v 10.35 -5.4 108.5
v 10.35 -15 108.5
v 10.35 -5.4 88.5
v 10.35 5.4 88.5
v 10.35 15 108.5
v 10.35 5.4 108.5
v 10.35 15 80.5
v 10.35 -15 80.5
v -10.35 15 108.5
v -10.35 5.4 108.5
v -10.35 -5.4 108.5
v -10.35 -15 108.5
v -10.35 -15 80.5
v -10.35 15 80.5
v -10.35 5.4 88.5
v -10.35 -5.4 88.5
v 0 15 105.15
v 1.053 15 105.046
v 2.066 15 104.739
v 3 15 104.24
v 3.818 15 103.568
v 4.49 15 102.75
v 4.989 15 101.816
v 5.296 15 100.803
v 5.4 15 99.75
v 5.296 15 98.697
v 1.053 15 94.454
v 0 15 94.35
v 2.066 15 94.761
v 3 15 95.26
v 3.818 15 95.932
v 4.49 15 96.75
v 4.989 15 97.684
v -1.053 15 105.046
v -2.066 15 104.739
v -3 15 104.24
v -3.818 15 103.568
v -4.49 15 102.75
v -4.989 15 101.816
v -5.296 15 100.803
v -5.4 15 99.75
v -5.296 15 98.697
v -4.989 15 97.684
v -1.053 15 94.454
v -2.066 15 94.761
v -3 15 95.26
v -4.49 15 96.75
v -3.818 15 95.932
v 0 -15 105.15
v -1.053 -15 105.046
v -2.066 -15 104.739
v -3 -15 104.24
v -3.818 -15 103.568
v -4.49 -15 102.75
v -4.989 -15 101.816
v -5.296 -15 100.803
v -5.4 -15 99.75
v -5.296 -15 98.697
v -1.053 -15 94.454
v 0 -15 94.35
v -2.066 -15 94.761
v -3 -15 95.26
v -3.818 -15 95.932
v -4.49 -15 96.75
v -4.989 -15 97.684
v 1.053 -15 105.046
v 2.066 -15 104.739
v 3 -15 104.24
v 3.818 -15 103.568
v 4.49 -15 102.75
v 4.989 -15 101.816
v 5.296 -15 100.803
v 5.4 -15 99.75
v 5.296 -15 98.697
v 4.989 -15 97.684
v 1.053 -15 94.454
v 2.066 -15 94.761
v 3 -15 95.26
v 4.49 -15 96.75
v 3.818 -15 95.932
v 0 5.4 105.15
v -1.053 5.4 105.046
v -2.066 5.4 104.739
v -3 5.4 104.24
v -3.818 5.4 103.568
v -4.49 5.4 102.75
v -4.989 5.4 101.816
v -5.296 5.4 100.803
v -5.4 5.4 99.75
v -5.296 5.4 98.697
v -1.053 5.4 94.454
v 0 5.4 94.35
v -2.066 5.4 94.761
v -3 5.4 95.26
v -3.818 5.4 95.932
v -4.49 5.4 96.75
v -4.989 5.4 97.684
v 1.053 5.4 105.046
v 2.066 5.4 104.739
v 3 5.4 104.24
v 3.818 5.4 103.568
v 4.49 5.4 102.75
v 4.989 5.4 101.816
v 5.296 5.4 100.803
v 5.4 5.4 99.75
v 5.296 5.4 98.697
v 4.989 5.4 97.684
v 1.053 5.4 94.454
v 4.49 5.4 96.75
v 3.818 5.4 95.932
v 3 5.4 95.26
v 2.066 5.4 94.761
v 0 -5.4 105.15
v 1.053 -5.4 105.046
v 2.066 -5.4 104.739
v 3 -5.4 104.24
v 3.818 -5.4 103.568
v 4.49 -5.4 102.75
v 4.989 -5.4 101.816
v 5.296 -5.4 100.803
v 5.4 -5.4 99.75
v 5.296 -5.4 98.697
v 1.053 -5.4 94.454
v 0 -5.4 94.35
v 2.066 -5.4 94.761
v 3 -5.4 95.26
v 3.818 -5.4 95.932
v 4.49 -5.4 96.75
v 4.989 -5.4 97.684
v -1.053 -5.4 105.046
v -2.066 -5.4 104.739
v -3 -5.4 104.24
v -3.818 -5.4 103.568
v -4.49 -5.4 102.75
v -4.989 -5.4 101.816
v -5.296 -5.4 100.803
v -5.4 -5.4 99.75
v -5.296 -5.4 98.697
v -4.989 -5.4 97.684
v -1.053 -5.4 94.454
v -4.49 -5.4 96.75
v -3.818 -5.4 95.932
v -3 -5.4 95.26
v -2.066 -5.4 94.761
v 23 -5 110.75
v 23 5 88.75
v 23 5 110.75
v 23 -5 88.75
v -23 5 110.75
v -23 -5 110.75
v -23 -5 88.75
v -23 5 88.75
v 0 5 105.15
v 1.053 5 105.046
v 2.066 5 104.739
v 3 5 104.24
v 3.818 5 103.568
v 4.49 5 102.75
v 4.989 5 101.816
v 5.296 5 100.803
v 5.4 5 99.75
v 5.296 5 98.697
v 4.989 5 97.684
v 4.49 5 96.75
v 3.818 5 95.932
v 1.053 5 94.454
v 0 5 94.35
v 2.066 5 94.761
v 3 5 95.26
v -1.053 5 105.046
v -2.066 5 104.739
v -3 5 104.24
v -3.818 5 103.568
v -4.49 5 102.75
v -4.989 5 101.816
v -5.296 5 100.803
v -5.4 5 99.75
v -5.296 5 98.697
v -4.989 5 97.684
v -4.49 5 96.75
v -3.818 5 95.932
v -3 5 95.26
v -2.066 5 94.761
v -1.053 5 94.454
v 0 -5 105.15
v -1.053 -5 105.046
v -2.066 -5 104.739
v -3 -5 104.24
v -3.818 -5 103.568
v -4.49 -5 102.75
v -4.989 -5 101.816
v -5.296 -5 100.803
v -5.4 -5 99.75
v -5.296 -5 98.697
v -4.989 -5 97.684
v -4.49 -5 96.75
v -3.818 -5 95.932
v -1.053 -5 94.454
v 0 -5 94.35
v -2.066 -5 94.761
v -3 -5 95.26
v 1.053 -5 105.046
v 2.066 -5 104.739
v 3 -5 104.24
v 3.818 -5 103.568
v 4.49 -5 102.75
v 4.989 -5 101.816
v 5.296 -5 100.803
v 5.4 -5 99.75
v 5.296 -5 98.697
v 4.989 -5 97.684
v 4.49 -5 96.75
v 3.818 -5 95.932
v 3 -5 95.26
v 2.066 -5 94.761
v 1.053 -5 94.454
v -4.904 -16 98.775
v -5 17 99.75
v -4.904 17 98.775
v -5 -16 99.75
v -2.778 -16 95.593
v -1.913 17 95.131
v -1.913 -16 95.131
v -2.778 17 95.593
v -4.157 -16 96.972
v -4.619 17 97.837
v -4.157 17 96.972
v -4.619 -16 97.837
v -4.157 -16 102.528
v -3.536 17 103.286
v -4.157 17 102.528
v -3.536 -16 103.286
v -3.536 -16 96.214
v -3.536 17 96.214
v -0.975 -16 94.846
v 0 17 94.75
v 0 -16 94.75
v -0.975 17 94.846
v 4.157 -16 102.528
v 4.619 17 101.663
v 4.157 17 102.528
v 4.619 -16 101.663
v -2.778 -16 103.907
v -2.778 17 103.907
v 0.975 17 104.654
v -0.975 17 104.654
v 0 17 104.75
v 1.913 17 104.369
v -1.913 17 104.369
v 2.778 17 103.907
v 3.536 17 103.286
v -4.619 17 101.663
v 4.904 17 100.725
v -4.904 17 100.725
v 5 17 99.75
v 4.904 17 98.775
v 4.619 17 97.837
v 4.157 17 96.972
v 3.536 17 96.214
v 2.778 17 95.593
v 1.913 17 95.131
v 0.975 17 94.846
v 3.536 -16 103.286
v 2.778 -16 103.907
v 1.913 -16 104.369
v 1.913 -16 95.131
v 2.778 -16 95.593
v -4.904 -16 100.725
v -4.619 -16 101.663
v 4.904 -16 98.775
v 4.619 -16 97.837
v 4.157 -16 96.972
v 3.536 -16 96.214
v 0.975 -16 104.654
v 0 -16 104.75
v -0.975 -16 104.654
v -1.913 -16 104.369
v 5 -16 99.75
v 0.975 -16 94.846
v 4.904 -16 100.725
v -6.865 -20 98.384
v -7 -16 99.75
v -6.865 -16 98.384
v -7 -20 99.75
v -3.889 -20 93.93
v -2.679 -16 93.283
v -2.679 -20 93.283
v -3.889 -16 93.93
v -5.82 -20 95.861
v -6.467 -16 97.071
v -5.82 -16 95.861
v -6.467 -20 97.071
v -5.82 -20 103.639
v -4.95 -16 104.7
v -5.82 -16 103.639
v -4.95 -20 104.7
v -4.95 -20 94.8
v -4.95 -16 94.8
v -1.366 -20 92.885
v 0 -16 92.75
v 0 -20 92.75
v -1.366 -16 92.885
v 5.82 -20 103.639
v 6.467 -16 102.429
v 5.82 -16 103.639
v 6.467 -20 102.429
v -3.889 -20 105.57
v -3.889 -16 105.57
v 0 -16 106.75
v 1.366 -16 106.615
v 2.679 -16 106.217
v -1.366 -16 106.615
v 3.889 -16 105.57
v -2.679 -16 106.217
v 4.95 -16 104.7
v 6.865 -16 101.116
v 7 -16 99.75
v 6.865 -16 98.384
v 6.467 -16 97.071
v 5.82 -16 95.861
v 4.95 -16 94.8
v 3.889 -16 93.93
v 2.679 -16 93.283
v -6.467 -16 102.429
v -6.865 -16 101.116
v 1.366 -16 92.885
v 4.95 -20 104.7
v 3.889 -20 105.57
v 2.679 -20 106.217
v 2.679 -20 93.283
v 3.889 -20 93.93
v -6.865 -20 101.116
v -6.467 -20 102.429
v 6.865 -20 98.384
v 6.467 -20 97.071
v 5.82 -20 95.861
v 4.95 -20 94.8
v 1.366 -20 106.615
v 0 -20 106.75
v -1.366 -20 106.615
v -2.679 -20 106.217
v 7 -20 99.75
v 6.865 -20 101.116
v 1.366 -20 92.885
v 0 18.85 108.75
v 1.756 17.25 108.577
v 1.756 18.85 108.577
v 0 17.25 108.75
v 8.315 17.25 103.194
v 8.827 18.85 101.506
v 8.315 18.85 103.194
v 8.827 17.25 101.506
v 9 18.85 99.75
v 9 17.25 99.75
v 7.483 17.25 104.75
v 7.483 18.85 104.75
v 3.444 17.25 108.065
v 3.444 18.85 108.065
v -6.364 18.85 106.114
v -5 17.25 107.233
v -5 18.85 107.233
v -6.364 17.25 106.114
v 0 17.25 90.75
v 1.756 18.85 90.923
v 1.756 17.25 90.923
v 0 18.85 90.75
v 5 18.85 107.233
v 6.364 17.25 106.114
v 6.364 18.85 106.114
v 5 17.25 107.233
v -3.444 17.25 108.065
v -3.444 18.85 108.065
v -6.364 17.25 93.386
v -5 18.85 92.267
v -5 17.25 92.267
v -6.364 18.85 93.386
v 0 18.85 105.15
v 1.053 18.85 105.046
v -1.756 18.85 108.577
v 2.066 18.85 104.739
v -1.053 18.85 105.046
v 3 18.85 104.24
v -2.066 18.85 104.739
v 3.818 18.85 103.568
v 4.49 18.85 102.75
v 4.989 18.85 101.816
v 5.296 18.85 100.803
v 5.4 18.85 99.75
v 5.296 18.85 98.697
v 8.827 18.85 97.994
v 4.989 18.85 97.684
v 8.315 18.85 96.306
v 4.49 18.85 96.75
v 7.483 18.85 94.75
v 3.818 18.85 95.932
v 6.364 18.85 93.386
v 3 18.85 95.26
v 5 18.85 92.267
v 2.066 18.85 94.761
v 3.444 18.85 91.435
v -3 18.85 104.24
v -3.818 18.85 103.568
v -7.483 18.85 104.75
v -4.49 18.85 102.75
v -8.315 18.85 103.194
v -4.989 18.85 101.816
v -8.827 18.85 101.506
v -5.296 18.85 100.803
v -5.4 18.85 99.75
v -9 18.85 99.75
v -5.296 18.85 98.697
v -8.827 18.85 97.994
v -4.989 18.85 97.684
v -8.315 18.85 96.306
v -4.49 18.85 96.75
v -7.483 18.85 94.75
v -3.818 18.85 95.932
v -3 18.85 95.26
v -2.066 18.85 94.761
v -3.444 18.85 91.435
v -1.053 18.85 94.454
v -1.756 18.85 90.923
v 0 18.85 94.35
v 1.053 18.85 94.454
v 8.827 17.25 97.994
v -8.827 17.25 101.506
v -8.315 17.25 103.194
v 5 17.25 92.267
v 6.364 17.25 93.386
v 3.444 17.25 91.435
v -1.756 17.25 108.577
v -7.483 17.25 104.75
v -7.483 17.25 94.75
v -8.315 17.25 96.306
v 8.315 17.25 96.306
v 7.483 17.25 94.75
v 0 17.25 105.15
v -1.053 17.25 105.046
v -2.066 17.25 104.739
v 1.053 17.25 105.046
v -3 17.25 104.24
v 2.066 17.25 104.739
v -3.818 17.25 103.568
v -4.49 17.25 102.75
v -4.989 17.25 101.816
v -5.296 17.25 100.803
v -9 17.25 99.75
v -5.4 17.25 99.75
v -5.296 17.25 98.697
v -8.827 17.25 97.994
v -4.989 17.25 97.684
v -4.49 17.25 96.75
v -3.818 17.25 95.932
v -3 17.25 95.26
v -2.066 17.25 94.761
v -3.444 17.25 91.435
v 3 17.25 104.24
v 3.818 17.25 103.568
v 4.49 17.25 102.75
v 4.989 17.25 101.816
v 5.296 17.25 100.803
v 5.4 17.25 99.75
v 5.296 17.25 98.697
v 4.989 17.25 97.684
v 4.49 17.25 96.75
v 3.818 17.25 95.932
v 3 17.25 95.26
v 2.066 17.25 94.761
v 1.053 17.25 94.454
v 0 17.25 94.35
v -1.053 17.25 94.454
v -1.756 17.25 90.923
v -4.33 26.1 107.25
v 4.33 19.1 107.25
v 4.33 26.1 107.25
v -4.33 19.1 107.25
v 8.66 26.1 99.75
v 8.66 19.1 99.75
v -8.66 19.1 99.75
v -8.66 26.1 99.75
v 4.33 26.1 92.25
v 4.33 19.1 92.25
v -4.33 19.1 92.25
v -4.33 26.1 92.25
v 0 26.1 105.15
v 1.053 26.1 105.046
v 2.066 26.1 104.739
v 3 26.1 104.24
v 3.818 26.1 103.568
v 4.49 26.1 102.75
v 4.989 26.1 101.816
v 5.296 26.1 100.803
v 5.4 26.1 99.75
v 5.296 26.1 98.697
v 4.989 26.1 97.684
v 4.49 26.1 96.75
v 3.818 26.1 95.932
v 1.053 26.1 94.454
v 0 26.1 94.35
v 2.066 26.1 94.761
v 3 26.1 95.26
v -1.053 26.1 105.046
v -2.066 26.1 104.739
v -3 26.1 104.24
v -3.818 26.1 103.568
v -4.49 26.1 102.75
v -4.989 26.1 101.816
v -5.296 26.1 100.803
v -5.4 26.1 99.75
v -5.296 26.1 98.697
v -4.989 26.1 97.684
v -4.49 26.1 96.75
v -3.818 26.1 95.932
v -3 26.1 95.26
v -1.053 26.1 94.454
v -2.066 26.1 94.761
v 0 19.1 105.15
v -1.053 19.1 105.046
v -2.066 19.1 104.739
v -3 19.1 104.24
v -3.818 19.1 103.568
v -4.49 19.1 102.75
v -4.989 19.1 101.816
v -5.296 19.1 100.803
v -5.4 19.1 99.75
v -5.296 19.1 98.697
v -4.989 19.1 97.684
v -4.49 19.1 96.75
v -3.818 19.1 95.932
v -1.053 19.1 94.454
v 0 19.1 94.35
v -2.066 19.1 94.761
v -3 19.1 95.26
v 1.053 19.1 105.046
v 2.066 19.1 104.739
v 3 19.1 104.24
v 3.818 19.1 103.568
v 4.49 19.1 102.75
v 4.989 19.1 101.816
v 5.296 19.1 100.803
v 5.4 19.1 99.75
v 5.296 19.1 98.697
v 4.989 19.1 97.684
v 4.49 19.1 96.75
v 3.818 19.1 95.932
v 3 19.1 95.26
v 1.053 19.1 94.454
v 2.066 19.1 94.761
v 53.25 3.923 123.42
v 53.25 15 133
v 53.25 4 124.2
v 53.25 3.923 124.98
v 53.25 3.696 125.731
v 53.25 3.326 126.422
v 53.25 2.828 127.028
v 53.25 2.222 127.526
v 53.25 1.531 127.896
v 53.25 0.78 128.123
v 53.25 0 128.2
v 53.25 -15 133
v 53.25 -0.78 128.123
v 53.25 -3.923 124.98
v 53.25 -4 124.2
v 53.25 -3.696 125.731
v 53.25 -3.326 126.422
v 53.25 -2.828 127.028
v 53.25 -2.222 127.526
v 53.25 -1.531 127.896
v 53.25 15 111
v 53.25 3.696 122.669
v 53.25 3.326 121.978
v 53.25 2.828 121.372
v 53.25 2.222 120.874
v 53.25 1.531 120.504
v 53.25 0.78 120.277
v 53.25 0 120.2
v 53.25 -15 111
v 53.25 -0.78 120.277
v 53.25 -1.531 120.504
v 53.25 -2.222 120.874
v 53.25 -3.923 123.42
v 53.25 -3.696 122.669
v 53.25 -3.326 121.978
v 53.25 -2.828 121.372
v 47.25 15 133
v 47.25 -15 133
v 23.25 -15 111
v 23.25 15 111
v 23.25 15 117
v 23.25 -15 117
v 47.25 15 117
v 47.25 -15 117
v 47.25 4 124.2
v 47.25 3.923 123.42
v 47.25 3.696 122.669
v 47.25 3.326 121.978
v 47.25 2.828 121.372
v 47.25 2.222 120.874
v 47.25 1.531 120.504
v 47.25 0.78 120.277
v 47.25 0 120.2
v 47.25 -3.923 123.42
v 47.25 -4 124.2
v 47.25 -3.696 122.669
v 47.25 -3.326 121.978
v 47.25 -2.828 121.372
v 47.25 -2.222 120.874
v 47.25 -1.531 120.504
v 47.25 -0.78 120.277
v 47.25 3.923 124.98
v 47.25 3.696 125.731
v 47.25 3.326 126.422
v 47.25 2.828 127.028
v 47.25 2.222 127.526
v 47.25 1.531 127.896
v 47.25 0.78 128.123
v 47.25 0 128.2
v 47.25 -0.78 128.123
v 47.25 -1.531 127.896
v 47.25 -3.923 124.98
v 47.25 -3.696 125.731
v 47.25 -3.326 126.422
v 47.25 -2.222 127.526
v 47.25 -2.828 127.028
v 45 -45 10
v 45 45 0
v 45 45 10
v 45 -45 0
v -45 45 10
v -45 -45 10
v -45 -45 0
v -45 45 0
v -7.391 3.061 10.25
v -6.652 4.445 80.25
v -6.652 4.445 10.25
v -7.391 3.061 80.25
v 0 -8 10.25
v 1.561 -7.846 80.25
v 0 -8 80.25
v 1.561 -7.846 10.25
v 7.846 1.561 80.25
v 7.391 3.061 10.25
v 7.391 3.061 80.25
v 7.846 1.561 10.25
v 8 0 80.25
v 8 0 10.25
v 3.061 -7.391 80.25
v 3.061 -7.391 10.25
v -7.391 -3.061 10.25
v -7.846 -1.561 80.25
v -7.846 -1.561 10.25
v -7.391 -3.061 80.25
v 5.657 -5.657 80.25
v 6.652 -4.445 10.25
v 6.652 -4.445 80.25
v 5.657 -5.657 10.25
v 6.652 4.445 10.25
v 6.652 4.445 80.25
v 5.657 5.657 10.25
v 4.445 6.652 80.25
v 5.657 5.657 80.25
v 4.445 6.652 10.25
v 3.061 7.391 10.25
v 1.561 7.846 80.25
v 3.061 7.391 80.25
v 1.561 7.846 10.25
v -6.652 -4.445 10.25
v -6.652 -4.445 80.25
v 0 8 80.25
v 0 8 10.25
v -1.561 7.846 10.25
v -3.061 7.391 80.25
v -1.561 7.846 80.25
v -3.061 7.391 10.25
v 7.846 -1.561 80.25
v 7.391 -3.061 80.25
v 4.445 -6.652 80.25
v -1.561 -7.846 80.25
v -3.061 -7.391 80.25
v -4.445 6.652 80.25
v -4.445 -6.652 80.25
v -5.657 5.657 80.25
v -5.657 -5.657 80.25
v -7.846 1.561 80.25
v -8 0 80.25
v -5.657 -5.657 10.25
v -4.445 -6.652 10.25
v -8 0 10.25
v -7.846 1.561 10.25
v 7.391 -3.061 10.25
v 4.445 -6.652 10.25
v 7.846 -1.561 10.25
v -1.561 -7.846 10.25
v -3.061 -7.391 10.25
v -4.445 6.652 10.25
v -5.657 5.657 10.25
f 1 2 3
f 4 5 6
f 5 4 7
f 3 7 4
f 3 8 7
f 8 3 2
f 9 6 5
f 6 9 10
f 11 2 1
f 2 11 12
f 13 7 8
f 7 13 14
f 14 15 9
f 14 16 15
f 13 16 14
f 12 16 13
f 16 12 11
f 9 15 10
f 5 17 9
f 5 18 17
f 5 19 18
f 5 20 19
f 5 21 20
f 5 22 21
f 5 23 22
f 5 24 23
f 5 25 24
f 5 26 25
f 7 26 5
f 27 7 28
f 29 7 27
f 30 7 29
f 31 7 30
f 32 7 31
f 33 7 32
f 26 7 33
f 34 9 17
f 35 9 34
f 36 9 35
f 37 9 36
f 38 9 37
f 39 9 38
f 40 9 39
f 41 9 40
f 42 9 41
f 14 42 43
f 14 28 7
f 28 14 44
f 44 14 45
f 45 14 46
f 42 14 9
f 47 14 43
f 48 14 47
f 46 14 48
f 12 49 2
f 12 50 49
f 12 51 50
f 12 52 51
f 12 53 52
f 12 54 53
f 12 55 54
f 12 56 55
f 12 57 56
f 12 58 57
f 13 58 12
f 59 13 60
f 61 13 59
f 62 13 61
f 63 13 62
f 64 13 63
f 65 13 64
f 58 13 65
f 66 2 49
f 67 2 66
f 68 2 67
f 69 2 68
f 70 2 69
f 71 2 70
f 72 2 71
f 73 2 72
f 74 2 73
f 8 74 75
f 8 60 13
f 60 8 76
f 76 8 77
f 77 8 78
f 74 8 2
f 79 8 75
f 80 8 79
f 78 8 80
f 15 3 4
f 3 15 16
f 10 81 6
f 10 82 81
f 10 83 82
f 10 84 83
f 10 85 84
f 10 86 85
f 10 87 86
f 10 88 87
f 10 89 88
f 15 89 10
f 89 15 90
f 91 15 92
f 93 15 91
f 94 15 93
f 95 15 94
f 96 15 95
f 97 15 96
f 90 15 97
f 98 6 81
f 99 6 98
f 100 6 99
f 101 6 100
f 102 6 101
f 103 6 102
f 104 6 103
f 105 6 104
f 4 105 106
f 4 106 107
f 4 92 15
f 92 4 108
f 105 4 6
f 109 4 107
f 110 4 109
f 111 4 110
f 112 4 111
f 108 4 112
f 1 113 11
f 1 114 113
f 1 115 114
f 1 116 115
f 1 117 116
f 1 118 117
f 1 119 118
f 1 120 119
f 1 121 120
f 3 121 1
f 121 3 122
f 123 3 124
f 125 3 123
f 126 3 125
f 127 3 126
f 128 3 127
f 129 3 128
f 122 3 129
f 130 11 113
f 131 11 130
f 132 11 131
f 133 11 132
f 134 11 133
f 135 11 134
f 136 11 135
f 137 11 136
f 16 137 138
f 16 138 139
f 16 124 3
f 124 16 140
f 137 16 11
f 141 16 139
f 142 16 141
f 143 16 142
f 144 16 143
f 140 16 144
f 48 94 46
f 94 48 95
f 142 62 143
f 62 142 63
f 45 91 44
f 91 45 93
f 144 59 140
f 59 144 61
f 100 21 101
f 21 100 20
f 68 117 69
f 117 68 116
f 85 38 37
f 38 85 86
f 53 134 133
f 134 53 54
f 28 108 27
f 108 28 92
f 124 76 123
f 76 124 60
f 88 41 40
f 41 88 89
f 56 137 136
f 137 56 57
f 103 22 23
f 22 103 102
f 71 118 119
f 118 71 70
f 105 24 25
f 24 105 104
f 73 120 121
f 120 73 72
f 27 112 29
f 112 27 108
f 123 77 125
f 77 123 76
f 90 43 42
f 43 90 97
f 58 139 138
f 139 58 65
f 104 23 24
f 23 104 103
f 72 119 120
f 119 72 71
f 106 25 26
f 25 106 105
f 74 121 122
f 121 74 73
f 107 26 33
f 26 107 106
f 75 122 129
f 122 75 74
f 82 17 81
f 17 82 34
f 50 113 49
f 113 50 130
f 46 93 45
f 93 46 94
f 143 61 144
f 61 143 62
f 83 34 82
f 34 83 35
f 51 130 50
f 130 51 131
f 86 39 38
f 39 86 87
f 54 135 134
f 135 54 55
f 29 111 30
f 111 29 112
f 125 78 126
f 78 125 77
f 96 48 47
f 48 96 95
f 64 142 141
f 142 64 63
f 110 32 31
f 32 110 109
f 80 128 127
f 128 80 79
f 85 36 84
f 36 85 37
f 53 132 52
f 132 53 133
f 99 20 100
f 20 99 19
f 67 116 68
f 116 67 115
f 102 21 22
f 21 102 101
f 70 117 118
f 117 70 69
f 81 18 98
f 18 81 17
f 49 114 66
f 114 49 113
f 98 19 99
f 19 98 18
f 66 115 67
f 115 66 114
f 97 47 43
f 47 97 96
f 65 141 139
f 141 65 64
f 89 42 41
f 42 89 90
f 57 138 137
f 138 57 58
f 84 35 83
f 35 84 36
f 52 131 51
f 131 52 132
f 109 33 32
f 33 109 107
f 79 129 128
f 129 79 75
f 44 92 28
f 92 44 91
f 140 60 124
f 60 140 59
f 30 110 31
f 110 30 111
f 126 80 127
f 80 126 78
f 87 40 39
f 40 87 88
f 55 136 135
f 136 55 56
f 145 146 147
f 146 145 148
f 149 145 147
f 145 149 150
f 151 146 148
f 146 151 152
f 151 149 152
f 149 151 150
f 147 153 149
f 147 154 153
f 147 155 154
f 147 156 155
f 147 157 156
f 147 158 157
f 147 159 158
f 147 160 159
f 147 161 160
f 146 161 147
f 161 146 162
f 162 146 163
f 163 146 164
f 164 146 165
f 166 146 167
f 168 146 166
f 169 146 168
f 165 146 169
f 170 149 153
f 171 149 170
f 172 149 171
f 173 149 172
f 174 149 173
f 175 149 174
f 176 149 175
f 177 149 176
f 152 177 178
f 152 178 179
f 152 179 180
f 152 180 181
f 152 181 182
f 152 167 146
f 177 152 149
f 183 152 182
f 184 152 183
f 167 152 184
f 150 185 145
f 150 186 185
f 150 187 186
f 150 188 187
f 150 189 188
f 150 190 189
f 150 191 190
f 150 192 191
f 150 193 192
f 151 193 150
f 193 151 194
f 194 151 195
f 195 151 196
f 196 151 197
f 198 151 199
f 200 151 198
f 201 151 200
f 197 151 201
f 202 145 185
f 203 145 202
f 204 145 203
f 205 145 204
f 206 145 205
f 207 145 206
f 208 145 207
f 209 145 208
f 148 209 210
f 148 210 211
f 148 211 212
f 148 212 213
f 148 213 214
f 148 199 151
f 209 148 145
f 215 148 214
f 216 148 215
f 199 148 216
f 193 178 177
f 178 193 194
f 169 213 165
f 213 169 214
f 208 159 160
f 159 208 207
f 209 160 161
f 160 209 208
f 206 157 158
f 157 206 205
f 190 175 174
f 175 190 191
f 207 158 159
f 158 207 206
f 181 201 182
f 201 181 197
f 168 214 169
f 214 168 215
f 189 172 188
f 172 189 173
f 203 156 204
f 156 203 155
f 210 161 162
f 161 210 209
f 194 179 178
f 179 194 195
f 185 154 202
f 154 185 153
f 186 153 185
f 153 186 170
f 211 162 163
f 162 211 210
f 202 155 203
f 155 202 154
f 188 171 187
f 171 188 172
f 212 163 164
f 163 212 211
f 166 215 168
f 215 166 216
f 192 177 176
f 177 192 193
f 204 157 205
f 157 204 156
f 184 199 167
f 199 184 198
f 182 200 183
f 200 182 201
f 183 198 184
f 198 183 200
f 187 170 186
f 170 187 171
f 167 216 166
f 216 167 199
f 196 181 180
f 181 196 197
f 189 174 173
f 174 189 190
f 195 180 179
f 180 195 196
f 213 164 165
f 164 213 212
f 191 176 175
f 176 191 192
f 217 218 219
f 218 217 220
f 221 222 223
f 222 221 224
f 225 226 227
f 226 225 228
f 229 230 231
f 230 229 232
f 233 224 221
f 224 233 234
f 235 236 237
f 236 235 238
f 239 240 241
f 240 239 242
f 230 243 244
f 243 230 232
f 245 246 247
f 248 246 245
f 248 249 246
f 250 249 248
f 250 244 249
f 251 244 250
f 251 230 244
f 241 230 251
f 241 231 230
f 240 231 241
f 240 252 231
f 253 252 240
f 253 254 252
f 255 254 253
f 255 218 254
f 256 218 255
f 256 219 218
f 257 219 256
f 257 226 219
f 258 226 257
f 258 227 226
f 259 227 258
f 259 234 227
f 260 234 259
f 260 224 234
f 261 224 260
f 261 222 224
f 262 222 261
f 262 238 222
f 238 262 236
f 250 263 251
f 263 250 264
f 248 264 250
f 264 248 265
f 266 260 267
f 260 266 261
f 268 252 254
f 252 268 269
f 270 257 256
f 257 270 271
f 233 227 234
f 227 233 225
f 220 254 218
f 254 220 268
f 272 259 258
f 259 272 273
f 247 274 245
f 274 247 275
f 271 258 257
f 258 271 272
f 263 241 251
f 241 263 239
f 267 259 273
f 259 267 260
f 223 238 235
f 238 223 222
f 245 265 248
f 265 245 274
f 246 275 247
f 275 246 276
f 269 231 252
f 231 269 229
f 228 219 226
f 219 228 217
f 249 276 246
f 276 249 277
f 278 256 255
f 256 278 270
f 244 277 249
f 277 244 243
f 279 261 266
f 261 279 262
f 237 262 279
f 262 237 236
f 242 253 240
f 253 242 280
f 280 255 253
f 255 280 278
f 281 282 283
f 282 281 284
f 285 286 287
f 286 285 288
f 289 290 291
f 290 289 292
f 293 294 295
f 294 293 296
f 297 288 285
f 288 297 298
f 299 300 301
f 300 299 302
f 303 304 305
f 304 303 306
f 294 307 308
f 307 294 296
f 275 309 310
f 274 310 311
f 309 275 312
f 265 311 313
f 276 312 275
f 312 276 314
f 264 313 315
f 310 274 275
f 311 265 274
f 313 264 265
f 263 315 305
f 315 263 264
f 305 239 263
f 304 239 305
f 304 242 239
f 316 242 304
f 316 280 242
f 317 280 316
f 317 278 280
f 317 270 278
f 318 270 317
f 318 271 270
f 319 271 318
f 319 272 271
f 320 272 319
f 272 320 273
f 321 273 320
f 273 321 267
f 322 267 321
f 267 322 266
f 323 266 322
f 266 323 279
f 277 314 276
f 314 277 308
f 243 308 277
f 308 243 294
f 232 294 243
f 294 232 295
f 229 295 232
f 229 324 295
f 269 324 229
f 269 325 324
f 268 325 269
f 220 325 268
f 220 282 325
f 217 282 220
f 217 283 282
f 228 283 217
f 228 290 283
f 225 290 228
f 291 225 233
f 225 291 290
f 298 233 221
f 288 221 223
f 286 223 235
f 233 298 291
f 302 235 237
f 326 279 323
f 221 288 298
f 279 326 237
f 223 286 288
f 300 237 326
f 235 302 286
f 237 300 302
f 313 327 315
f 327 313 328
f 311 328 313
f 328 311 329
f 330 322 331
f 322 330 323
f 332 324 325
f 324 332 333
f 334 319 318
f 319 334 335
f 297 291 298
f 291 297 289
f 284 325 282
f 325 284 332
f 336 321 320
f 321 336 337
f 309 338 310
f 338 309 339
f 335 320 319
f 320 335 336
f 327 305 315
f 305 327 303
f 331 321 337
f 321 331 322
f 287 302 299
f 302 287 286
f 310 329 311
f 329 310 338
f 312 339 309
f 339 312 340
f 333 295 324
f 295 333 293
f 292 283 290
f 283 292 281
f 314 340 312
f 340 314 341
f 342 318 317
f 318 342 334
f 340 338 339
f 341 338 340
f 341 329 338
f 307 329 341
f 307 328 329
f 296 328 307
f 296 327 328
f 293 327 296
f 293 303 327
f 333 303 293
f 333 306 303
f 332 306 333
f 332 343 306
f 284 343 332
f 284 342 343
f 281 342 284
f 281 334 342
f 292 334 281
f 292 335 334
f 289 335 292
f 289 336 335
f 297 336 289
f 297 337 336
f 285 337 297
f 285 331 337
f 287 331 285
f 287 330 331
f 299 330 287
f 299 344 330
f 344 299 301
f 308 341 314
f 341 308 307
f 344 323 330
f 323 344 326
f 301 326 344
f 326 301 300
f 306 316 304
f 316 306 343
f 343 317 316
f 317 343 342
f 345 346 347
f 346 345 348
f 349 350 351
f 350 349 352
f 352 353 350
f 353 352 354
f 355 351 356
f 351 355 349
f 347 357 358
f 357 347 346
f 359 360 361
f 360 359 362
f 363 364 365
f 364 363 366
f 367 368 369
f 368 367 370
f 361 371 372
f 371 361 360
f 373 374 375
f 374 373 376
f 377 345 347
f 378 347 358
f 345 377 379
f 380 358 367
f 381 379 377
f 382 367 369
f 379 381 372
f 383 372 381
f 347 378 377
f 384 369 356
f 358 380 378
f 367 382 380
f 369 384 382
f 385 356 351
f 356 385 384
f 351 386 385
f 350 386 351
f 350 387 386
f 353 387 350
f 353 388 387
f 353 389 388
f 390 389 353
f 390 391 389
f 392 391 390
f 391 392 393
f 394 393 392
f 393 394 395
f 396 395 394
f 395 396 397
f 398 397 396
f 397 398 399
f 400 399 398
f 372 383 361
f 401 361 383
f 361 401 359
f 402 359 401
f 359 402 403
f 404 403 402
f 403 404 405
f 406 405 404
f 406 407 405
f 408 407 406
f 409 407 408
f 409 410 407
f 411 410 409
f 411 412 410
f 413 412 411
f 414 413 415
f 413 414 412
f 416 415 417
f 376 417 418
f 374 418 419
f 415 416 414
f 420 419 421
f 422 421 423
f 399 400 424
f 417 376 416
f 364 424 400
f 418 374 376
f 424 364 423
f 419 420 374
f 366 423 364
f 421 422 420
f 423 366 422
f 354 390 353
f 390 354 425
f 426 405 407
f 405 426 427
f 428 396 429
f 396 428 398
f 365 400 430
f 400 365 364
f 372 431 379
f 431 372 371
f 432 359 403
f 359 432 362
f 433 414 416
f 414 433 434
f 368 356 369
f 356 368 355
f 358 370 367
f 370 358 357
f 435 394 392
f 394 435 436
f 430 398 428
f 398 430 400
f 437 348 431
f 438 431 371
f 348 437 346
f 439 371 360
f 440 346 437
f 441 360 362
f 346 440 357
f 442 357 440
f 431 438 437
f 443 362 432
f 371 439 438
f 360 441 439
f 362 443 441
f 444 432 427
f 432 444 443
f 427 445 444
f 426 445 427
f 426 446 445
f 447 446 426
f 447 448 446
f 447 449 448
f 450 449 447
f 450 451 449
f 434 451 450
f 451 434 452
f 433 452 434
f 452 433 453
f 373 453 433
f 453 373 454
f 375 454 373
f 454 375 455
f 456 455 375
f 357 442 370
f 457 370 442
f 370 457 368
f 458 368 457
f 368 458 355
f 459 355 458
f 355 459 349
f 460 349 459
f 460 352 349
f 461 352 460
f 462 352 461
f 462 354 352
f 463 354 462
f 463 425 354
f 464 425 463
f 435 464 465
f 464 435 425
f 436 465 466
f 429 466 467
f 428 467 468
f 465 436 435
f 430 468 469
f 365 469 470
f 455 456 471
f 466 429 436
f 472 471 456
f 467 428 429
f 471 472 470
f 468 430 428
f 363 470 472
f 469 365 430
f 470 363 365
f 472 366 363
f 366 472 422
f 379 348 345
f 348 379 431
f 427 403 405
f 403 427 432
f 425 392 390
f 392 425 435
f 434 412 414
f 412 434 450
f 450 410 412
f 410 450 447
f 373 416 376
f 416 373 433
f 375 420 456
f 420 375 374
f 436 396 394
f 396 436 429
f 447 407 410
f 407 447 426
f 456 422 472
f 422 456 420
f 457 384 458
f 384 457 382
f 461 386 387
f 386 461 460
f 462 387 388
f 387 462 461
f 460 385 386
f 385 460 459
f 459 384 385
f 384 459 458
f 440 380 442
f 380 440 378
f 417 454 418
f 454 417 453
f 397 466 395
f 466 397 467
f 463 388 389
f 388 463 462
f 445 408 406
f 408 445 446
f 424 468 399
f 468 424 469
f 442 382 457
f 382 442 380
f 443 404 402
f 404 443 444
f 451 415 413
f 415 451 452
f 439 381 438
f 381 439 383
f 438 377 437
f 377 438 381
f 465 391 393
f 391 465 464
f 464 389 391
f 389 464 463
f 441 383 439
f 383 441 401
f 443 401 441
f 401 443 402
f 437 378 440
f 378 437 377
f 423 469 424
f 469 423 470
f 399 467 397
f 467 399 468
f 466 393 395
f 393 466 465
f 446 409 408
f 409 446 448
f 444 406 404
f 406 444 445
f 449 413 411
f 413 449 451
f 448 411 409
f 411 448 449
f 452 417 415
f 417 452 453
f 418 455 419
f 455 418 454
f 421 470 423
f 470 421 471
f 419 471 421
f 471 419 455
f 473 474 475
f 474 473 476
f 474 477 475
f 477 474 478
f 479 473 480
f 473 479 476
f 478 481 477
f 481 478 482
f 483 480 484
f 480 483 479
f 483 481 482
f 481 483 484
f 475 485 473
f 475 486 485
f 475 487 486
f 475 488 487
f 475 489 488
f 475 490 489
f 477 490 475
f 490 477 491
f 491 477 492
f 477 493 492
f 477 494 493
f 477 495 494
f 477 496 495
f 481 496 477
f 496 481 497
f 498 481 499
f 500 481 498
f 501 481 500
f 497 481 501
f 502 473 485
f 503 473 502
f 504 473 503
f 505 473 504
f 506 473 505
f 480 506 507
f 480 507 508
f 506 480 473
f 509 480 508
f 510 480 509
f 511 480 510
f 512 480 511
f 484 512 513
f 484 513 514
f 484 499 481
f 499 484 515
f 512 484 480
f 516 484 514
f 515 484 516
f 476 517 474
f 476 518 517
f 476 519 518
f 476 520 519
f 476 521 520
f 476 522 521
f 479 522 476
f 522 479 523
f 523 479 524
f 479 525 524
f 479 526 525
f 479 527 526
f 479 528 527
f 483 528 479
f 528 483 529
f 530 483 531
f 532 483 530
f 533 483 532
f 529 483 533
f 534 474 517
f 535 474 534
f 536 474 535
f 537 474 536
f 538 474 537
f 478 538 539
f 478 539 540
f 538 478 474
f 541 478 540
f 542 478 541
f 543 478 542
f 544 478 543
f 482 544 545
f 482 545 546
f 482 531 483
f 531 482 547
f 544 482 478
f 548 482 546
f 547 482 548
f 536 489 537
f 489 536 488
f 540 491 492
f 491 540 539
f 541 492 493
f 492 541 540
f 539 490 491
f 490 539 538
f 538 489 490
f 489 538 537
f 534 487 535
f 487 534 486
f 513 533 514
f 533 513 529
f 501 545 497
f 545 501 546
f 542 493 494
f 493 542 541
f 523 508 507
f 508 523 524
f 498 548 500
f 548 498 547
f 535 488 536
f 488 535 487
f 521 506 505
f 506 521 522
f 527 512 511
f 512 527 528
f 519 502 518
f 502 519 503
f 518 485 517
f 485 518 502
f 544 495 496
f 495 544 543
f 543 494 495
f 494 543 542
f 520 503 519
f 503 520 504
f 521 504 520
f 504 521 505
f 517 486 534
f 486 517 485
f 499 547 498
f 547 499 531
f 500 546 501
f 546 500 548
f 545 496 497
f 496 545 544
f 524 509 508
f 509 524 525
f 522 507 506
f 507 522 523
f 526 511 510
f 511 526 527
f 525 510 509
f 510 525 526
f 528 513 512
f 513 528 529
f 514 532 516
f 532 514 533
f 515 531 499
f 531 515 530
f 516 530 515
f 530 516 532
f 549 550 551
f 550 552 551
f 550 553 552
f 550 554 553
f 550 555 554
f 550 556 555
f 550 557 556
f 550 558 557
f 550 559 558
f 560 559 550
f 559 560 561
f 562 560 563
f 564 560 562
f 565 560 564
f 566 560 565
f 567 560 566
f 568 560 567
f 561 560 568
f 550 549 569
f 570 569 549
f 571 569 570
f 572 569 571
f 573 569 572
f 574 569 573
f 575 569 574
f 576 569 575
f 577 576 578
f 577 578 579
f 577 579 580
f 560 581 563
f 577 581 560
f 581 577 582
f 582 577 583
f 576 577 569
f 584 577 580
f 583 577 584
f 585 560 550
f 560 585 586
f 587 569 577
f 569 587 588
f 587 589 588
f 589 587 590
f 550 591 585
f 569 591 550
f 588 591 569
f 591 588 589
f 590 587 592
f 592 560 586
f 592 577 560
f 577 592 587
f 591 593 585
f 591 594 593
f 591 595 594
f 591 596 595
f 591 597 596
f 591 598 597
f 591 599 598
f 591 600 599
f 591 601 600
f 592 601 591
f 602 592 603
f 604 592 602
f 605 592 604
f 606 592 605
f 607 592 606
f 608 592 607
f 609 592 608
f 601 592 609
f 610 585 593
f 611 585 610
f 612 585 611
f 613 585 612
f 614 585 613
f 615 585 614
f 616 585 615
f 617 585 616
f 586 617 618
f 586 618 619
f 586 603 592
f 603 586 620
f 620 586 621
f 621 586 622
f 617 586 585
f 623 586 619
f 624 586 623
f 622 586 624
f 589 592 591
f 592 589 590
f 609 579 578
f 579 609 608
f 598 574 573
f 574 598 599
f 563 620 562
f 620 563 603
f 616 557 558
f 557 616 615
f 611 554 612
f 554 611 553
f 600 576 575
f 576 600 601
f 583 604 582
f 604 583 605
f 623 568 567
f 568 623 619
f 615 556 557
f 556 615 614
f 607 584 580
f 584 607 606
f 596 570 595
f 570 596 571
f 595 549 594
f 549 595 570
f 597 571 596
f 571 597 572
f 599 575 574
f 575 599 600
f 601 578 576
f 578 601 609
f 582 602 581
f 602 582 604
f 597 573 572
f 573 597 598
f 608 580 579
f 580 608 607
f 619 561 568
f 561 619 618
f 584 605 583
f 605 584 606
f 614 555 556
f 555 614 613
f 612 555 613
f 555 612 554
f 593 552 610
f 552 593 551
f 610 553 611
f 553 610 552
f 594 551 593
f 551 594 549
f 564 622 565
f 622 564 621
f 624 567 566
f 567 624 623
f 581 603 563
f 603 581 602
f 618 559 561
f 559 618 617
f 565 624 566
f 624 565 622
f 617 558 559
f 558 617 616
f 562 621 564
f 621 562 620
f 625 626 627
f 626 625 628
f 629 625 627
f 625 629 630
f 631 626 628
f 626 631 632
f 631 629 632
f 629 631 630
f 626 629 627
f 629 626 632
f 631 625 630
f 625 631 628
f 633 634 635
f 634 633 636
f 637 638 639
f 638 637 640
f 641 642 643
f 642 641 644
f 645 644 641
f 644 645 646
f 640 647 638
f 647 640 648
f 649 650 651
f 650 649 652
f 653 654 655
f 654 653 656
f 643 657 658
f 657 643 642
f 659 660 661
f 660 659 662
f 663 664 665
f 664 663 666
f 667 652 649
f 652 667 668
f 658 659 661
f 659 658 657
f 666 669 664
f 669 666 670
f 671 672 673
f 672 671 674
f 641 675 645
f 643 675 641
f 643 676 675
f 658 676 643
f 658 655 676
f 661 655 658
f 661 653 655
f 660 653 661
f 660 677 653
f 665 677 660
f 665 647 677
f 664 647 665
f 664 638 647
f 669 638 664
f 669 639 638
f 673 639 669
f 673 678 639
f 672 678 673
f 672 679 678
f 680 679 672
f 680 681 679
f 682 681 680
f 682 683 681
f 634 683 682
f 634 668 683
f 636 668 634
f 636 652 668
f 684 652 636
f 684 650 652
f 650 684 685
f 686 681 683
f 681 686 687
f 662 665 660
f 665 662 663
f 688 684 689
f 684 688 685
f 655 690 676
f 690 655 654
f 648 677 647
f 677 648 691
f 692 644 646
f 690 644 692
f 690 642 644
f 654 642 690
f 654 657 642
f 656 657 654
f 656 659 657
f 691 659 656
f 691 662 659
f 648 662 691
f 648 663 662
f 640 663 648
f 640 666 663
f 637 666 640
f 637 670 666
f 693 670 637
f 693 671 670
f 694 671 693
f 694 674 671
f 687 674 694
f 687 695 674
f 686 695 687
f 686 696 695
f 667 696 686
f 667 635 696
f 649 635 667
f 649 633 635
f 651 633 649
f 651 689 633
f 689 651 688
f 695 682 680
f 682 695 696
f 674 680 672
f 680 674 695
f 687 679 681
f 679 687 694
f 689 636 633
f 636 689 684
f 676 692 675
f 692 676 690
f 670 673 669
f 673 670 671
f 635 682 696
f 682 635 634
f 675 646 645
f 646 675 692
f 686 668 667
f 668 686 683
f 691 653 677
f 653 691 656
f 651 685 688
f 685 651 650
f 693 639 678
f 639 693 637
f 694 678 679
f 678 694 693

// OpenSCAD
$fn = 32;

// ------------------------------------------------------------------------
// Lamp arm: column d16 x 70 mm, arm 46 mm
// Every part is its own module, assembly() places every instance.
// ------------------------------------------------------------------------

// --- part 1 ---
module lamp_base() {
  difference() {
    translate([-45, -45, 0]) cube([90, 90, 10]);
  }
}

// --- part 2 ---
module lamp_column() {
  cylinder(h = 70, d = 16);
}

// --- part 3 ---
module head_fork() {
  difference() {
    translate([-10.35, -15, 0]) cube([20.7, 30, 28]);
    translate([-11.35, -5.4, 8]) cube([22.7, 10.8, 21]);
    translate([0, 0, 19.25]) rotate([90, 0, 0]) cylinder(h = 32, d = 10.8, center = true);
  }
}

// --- part 4 ---
module lamp_arm() {
  difference() {
    translate([-23, -5, 0]) cube([46, 10, 22]);
    translate([0, 0, 11]) rotate([90, 0, 0]) cylinder(h = 12, d = 10.8, center = true);
  }
}

// --- part 5 ---
module arm_pin() {
  rotate([0, 90, 0]) cylinder(h = 34, d = 10, center = true);
  translate([-20, 0, 0]) rotate([0, 90, 0]) cylinder(h = 4, d = 14);
}

// --- part 6 ---
module arm_washer() {
  difference() {
      translate([0, 0, 0]) cylinder(h = 1.6, d = 18);
      translate([0, 0, -1]) cylinder(h = 3.6, d = 10.8);
    }
}

// --- part 7 ---
module arm_nut() {
  difference() {
    linear_extrude(height = 7) polygon(points = [[8.66, 0], [4.33, 7.5], [-4.33, 7.5], [-8.66, 0], [-4.33, -7.5], [4.33, -7.5]]);
    translate([0, 0, -1]) cylinder(h = 9, d = 10.8);
  }
}

// --- part 8 ---
module shade_bracket() {
  difference() {
    translate([-15, -15, 0]) cube([30, 30, 22]);
    translate([-16, -16, 6]) cube([25, 32, 17]);
    translate([12, 0, 13.2]) rotate([0, 90, 0]) cylinder(h = 8, d = 8, center = true);
  }
}

// --- assembly ---
module assembly() {
  color([0.80, 0.24, 0.20]) translate([0, 0, 0]) rotate([0, 0, 0]) lamp_base();
  color([0.20, 0.45, 0.75]) translate([0, 0, 10.25]) rotate([0, 0, 0]) lamp_column();
  color([0.25, 0.62, 0.32]) translate([0, 0, 80.5]) rotate([0, 0, 0]) head_fork();
  color([0.92, 0.70, 0.18]) translate([0, 0, 88.75]) rotate([0, 0, 0]) lamp_arm();
  color([0.58, 0.35, 0.70]) translate([0, 0, 99.75]) rotate([0, 0, 90]) arm_pin();
  color([0.16, 0.66, 0.66]) translate([0, 18.85, 99.75]) rotate([90, 0, 0]) arm_washer();
  color([0.85, 0.48, 0.18]) translate([0, 26.1, 99.75]) rotate([90, 0, 0]) arm_nut();
  color([0.55, 0.60, 0.65]) translate([38.25, 0, 111]) rotate([0, 0, 0]) shade_bracket();
}

assembly();
